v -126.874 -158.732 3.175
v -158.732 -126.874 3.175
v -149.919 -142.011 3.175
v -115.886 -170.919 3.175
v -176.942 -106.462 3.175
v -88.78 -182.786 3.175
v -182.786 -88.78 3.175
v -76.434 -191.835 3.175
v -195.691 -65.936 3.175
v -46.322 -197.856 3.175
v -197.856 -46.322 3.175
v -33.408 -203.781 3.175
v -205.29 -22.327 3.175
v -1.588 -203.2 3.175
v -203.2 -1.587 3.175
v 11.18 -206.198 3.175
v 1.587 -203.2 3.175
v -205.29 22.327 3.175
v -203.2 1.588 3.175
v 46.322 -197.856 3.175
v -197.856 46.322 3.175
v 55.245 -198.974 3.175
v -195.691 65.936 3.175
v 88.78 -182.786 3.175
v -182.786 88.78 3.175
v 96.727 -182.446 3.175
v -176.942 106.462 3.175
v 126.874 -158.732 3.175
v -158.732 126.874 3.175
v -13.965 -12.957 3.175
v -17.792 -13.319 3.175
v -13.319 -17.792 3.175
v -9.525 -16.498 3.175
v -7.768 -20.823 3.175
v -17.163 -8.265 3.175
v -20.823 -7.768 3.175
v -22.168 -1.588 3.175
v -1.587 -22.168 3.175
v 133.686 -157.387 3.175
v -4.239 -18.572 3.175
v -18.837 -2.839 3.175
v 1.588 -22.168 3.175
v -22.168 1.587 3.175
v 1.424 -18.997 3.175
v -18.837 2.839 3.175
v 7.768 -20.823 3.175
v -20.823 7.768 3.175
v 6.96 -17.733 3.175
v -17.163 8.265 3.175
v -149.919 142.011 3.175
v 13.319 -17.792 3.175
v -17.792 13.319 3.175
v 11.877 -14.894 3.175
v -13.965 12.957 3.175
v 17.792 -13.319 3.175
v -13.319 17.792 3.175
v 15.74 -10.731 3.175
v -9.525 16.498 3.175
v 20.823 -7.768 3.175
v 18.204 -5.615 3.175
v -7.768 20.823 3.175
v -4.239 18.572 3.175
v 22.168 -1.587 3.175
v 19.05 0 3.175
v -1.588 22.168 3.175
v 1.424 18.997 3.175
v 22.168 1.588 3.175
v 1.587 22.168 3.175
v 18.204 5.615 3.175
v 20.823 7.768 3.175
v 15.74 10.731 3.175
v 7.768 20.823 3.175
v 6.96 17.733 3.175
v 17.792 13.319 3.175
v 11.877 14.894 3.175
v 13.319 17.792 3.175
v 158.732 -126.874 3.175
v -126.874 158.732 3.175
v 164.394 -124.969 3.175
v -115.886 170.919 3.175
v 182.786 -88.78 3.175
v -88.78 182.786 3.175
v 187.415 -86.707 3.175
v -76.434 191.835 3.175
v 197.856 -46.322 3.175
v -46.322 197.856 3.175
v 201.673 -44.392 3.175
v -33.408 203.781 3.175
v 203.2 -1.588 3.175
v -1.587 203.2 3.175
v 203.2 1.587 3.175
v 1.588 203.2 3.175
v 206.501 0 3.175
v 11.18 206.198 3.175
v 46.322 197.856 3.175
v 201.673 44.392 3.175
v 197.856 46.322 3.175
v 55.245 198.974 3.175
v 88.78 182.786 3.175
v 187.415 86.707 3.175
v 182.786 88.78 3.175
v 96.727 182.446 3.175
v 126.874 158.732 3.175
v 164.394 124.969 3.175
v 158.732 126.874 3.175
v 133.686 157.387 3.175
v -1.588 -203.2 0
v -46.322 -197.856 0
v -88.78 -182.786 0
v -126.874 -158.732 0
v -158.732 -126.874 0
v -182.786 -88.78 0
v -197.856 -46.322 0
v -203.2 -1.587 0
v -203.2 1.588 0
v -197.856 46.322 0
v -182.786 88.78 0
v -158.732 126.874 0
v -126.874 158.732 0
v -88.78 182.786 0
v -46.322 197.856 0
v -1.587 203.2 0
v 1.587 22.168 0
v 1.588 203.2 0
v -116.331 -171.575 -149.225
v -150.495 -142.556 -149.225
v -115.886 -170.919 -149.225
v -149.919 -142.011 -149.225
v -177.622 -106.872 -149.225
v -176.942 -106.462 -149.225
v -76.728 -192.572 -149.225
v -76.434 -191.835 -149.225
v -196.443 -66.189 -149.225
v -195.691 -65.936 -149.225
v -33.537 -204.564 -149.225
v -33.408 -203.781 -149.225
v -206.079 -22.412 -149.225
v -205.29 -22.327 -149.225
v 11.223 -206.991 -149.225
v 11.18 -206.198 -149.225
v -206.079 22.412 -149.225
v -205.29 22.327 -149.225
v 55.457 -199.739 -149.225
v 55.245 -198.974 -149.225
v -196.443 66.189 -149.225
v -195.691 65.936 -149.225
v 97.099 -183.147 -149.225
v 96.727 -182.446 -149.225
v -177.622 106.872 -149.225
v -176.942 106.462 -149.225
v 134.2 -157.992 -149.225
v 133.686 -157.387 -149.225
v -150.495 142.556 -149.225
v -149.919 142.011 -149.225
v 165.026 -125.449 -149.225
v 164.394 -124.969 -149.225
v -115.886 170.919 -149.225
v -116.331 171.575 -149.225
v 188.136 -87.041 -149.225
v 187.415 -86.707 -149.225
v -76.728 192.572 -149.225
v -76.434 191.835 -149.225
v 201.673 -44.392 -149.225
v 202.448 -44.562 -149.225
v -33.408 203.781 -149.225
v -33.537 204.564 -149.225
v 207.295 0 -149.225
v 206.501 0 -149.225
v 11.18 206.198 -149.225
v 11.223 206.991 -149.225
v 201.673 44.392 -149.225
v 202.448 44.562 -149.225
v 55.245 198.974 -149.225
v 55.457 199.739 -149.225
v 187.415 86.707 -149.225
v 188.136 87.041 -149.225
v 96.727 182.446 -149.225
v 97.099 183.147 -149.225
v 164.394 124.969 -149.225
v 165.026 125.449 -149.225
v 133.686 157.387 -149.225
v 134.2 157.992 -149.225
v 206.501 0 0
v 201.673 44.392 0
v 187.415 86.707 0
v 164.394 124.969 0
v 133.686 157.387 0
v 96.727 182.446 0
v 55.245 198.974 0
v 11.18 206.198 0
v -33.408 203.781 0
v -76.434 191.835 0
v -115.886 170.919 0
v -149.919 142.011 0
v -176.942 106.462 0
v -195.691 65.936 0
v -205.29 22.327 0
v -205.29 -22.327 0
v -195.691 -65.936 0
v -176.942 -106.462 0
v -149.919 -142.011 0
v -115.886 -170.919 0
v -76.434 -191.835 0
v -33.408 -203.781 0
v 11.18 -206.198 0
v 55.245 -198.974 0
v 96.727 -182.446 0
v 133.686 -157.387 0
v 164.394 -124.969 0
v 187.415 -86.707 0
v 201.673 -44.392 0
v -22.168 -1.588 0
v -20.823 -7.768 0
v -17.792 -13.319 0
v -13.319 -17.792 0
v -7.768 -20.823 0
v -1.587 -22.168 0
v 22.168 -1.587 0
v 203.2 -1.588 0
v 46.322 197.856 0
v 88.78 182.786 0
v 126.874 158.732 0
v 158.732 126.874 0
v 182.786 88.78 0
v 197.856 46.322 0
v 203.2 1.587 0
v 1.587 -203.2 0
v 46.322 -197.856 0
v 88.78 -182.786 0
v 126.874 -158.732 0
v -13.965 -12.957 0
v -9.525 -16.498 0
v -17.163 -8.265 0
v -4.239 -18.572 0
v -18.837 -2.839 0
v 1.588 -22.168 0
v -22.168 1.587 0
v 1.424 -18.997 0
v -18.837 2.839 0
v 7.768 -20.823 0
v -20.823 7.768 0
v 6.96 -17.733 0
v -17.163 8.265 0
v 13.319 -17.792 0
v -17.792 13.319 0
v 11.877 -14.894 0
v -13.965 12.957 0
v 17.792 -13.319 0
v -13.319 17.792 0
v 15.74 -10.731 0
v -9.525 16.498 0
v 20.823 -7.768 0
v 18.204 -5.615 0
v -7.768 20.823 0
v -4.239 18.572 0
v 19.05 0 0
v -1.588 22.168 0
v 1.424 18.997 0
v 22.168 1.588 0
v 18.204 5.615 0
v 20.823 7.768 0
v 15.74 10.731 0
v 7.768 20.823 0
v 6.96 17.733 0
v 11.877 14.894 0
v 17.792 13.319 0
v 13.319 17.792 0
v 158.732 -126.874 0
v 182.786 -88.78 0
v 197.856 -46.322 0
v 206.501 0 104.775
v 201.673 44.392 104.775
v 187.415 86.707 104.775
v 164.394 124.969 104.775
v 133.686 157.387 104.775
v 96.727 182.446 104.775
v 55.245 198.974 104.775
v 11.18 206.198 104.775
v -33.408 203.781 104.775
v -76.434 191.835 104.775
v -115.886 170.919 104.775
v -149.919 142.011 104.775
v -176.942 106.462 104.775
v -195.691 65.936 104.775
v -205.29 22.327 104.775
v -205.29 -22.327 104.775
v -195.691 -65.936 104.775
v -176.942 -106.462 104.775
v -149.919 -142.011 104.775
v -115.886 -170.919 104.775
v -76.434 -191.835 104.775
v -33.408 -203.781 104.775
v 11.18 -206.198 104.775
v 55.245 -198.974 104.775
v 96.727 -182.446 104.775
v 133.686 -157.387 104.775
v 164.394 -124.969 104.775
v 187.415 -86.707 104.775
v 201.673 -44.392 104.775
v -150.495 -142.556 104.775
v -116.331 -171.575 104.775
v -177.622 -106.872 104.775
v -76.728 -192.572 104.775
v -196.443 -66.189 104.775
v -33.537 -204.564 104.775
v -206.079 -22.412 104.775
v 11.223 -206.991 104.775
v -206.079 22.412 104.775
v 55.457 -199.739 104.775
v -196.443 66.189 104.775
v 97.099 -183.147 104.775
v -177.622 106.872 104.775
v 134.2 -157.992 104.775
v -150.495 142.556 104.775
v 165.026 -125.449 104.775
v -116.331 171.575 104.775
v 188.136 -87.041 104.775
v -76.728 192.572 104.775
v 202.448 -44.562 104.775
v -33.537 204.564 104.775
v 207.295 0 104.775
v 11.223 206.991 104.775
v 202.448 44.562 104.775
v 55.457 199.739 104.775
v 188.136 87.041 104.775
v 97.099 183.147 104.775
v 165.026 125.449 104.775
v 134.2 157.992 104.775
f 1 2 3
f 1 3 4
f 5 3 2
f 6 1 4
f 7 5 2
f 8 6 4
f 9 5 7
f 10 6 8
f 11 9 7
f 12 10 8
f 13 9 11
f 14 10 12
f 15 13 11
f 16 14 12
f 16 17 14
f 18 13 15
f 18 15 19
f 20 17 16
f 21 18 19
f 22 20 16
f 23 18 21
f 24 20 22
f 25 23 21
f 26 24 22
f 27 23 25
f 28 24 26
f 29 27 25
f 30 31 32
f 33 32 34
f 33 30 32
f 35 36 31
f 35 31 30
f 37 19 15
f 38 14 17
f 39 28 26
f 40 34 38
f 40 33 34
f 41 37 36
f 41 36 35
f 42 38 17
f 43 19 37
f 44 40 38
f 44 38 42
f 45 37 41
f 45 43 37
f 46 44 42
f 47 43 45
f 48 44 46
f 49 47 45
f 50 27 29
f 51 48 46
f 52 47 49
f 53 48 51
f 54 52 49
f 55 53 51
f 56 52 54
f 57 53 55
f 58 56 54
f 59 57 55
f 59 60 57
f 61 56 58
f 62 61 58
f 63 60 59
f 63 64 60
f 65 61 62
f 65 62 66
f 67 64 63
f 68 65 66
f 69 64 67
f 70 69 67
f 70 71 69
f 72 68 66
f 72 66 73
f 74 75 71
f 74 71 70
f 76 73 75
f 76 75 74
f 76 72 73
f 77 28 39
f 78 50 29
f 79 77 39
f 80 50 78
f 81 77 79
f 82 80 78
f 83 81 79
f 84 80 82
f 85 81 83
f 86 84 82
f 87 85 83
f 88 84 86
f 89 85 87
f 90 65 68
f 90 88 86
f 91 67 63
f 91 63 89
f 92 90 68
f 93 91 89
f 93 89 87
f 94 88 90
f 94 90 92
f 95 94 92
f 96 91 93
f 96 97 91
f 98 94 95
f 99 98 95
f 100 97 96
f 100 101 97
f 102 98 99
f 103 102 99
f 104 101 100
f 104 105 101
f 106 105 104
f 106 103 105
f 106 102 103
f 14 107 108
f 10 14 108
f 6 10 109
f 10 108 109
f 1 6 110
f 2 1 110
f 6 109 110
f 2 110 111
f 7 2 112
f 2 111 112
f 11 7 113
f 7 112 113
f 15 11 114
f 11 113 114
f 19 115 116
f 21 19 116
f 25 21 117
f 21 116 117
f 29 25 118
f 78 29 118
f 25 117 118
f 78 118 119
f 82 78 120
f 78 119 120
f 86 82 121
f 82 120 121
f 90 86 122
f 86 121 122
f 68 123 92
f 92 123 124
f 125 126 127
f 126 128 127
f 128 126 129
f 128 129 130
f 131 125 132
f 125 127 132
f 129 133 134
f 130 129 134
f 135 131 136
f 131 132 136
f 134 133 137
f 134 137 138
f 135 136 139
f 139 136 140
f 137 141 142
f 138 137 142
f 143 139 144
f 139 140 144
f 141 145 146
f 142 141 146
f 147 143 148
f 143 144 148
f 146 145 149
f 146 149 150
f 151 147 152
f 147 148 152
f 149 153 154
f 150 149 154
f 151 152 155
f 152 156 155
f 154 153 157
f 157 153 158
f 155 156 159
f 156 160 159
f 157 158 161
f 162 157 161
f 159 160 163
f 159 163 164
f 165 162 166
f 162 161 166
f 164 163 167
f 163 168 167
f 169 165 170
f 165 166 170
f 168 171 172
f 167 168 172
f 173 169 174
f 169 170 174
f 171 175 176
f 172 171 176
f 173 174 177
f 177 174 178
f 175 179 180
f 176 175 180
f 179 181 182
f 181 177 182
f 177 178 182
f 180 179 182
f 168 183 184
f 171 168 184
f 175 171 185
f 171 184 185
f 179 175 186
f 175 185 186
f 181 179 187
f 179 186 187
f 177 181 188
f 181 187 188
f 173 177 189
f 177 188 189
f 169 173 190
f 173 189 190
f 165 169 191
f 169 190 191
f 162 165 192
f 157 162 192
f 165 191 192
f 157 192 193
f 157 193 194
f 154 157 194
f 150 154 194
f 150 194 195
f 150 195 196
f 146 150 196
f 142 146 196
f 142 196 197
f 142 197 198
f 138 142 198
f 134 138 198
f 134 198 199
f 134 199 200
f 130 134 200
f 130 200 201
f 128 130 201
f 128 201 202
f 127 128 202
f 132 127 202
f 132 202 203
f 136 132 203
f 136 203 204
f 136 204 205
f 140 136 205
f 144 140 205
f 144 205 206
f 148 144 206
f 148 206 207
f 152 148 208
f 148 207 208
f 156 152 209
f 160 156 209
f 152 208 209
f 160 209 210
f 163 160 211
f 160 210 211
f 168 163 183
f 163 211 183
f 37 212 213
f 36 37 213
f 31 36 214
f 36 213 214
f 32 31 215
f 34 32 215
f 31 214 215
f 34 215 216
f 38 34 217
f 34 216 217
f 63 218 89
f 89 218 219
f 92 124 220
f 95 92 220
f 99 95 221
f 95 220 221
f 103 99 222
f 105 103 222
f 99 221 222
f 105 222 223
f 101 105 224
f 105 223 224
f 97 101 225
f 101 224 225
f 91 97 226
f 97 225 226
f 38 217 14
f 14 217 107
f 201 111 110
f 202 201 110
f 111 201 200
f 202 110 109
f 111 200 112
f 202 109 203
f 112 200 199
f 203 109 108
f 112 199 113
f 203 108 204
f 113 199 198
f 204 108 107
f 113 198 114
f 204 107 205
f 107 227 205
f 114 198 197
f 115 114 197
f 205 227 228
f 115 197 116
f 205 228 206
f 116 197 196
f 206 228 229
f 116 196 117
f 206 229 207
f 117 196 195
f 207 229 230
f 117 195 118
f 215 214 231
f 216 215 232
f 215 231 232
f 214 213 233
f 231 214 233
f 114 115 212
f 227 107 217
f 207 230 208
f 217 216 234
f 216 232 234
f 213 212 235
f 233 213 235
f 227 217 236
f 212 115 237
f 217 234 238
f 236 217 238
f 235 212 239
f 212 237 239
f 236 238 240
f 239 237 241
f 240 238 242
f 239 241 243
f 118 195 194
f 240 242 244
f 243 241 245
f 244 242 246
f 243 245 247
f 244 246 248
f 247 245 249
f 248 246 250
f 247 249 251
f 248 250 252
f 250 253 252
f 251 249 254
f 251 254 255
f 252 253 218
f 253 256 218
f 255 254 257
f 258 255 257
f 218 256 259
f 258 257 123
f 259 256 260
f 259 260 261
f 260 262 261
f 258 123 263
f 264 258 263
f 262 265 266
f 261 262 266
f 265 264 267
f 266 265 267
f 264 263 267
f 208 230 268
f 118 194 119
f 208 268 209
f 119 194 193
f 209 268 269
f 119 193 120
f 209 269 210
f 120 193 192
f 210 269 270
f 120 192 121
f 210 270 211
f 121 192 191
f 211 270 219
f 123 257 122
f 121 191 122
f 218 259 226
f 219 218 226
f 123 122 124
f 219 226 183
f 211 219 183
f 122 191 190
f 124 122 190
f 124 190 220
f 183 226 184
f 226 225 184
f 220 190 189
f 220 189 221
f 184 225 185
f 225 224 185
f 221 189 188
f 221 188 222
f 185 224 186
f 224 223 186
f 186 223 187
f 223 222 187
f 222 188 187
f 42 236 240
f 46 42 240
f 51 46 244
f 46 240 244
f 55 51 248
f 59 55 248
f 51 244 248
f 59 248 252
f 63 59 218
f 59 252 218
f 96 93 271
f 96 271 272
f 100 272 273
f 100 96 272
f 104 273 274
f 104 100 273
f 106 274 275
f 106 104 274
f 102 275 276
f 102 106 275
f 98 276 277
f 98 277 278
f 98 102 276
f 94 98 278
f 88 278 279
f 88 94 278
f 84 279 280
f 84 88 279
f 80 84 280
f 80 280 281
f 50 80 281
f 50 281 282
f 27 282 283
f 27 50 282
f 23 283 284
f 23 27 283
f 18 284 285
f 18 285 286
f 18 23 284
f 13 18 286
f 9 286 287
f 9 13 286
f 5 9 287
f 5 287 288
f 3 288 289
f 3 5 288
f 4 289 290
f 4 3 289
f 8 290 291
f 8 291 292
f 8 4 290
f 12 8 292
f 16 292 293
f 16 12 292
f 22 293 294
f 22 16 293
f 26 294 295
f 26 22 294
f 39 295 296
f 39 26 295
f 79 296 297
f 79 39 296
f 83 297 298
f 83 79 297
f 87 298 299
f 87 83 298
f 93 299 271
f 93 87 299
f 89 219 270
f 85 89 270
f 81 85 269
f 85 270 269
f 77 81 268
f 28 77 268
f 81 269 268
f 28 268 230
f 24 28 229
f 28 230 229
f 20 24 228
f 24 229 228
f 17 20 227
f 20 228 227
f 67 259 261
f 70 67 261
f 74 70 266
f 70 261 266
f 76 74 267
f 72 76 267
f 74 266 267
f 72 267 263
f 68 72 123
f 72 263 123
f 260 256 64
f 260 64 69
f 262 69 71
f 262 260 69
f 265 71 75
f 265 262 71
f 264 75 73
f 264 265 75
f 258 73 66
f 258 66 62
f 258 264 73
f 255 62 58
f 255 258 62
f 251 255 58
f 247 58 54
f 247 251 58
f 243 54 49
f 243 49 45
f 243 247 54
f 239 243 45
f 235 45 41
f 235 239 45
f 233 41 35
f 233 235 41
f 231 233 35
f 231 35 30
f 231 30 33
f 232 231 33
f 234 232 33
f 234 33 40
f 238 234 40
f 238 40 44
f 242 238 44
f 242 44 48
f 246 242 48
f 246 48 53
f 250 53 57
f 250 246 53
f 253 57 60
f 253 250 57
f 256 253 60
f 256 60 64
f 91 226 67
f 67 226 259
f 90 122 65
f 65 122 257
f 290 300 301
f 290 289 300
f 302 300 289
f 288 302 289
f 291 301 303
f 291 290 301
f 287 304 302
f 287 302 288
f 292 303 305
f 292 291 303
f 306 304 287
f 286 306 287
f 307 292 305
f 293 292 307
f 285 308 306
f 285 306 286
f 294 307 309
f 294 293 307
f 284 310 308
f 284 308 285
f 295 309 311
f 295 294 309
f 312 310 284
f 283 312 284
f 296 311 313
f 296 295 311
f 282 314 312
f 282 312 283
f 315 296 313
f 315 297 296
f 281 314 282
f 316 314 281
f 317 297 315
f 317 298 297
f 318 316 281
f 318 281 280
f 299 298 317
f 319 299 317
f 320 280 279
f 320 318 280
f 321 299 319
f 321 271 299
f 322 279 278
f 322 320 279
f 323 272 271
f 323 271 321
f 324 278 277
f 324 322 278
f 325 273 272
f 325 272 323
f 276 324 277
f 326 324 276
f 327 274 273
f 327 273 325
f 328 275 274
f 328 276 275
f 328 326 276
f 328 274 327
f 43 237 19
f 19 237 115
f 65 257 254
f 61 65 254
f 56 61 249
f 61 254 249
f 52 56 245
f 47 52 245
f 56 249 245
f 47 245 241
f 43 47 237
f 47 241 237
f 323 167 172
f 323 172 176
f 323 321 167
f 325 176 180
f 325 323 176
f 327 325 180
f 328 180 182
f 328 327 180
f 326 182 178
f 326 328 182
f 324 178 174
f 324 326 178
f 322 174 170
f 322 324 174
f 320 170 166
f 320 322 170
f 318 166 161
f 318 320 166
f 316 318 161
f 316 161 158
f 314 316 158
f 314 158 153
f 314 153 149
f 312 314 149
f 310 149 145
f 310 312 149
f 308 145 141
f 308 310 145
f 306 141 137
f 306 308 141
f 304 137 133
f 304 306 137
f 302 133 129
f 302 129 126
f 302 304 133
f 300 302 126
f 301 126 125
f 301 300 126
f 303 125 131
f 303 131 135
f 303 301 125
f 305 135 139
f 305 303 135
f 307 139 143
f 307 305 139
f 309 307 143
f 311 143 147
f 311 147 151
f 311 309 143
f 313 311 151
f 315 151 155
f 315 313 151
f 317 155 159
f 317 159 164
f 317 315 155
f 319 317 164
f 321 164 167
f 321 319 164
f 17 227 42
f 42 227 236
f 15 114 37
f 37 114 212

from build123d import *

# Parameters (mm, degrees)
F0_R          = 206.500881119
F0_R_2        = 19.05
F1_DEPTH      = 3.175
F2_R          = 207.294631119
F2_R_2        = 206.500881119
F3_DEPTH      = 101.6
F3_DEPTH_BACK = 152.4


with BuildPart() as f1:
    # F0 (on Top) → F1 (new body)
    with BuildSketch(Plane.XY):
        Circle(F0_R)
        with BuildLine():
            Line((-203.2, -1.5875), (-22.1682310695, -1.5875))
            ThreePointArc((-22.1682310695, -1.5875), (-15.7154482119, -15.7154482119), (-1.5875, -22.1682310695))
            Line((-1.5875, -22.1682310695), (-1.5875, -203.2))
            ThreePointArc((-1.5875, -203.2), (-143.6884827609, -143.6884827609), (-203.2, -1.5875))
        make_face(mode=Mode.SUBTRACT)
        with BuildLine():
            Line((22.1682310695, -1.5875), (203.2, -1.5875))
            ThreePointArc((203.2, -1.5875), (143.6884827609, -143.6884827609), (1.5875, -203.2))
            Line((1.5875, -203.2), (1.5875, -22.1682310695))
            ThreePointArc((1.5875, -22.1682310695), (15.7154482119, -15.7154482119), (22.1682310695, -1.5875))
        make_face(mode=Mode.SUBTRACT)
        with BuildLine():
            ThreePointArc((-203.2, 1.5875), (-143.6884827609, 143.6884827609), (-1.5875, 203.2))
            Line((-1.5875, 203.2), (-1.5875, 22.1682310695))
            ThreePointArc((-1.5875, 22.1682310695), (-15.7154482119, 15.7154482119), (-22.1682310695, 1.5875))
            Line((-22.1682310695, 1.5875), (-203.2, 1.5875))
        make_face(mode=Mode.SUBTRACT)
        Circle(F0_R_2, mode=Mode.SUBTRACT)
        with BuildLine():
            Line((203.2, 1.5875), (22.1682310695, 1.5875))
            ThreePointArc((22.1682310695, 1.5875), (15.7154482119, 15.7154482119), (1.5875, 22.1682310695))
            Line((1.5875, 22.1682310695), (1.5875, 203.2))
            ThreePointArc((1.5875, 203.2), (143.6884827609, 143.6884827609), (203.2, 1.5875))
        make_face(mode=Mode.SUBTRACT)
    extrude(amount=F1_DEPTH)

    # F2 (on face) → F3 (join, two sides)
    with BuildSketch(Plane.XY.offset(3.175)) as f3_sk:
        Circle(F2_R)
        Circle(F2_R_2, mode=Mode.SUBTRACT)
    extrude(amount=F3_DEPTH)
    extrude(f3_sk.sketch, amount=-F3_DEPTH_BACK)


solid = f1.part
